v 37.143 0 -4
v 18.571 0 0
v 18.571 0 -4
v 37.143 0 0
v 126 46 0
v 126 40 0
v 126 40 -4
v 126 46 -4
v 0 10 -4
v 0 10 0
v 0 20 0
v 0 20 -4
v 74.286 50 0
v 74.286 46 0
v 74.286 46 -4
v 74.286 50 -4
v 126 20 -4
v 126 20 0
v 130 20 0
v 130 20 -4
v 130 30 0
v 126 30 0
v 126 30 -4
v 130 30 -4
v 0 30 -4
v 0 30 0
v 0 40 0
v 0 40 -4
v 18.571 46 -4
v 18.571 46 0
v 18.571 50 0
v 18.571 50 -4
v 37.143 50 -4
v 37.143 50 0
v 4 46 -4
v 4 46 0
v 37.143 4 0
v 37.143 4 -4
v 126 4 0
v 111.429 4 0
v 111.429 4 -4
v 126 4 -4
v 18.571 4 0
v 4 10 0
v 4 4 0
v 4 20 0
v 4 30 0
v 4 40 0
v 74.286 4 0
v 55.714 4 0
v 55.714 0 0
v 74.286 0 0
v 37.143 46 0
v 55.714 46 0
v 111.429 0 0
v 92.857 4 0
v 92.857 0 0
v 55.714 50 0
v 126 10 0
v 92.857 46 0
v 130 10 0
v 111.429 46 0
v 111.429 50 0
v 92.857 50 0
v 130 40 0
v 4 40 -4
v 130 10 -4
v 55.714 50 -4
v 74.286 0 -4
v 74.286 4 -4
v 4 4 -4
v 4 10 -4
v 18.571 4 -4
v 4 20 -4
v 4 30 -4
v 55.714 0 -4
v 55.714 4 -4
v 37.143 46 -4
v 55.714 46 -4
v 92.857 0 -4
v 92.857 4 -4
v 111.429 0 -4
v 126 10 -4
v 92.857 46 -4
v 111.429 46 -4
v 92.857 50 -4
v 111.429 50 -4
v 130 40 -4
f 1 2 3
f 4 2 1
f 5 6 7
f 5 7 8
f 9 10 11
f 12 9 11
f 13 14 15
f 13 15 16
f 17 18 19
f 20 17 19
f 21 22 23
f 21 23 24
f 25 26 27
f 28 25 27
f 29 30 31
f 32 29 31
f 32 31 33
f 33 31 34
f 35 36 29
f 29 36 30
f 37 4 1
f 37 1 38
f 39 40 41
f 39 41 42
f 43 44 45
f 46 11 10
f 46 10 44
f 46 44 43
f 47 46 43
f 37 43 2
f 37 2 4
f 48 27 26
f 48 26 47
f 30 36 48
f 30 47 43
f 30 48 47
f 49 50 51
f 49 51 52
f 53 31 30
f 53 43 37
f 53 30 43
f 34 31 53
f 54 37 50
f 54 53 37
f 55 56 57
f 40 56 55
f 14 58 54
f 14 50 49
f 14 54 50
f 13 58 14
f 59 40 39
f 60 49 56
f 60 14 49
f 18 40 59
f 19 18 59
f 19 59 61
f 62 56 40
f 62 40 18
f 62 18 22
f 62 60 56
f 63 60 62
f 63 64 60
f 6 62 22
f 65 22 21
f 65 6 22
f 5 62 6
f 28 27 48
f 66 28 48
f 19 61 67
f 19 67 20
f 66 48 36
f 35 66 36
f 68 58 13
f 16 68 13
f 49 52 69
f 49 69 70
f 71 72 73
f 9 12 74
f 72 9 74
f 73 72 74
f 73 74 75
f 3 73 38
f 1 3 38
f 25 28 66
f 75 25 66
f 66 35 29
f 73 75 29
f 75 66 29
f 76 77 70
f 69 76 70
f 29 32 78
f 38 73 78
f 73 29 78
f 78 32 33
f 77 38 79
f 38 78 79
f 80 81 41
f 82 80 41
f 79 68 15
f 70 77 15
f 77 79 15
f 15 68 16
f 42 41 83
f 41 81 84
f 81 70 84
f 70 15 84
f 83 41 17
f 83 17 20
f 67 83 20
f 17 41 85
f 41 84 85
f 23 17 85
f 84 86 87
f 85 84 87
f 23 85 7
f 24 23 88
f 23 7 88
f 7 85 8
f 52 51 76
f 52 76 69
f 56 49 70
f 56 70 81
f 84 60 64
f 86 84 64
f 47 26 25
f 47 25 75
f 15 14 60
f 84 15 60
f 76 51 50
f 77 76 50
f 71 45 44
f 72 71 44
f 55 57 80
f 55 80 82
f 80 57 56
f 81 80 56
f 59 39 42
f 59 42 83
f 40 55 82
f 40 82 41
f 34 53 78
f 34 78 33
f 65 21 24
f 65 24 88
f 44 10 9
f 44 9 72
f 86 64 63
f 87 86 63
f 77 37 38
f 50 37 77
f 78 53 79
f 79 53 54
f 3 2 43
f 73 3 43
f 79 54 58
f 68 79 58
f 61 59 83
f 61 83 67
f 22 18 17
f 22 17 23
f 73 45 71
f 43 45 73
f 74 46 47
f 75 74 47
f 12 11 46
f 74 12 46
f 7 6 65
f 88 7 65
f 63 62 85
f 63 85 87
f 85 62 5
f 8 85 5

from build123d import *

# Parameters (mm, degrees)
BUITENAFMETING_RECHTHOEK_W  = 130
BUITENAFMETING_RECHTHOEK_H  = 50
PLAAT_DEPTH                 = 4
TAND_HOR_W                  = 18.571428571
TAND_HOR_H                  = 4
TAND_BOVEN_DEPTH            = 5
TANDEN_PATROON_BOVEN_COUNT  = 4
TANDEN_PATROON_BOVEN_PITCH  = 37.142857143
TAND_VER_W                  = 4
TAND_VER_H                  = 10
TAND_LINKS_DEPTH            = 5
TANDEN_PATROON_LINKS_COUNT  = 3
TANDEN_PATROON_LINKS_PITCH  = 20
TAND_O_W                    = 18.571428571
TAND_O_H                    = 4
TAND_ONDER_DEPTH            = 5
TANDEN_PATROON_ONDER_COUNT  = 4
TANDEN_PATROON_ONDER_PITCH  = 37.142857143
TAND_R_W                    = 4
TAND_R_H                    = 10
TAND_RECHTS_DEPTH           = 5
TANDEN_PATROON_RECHTS_COUNT = 3
TANDEN_PATROON_RECHTS_PITCH = 20


with BuildPart() as part:
    # Buitenafmeting Rechthoek → Plaat (new body)
    with BuildSketch(Plane.XY):
        with Locations((65, 25)):
            Rectangle(BUITENAFMETING_RECHTHOEK_W, BUITENAFMETING_RECHTHOEK_H)
    extrude(amount=-PLAAT_DEPTH)

    # Tand Hor → Tand Boven (cut, through all)
    with BuildSketch(Plane.XY):
        with Locations((9.285714286, 48)):
            Rectangle(TAND_HOR_W, TAND_HOR_H)
    tand_boven = extrude(amount=-TAND_BOVEN_DEPTH, mode=Mode.SUBTRACT)

    # Tanden Patroon Boven: Tand Boven ×4
    with Locations(*[(i * TANDEN_PATROON_BOVEN_PITCH, 0, 0) for i in range(1, TANDEN_PATROON_BOVEN_COUNT)]):
        add(tand_boven, mode=Mode.SUBTRACT)

    # Tand Ver → Tand Links (cut, through all)
    with BuildSketch(Plane.XY):
        with Locations((2, 45)):
            Rectangle(TAND_VER_W, TAND_VER_H)
    tand_links = extrude(amount=-TAND_LINKS_DEPTH, mode=Mode.SUBTRACT)

    # Tanden Patroon Links: Tand Links ×3
    with Locations(*[(0, -i * TANDEN_PATROON_LINKS_PITCH, 0) for i in range(1, TANDEN_PATROON_LINKS_COUNT)]):
        add(tand_links, mode=Mode.SUBTRACT)

    # Tand O → Tand Onder (cut, through all)
    with BuildSketch(Plane.XY):
        with Locations((9.285714286, 2)):
            Rectangle(TAND_O_W, TAND_O_H)
    tand_onder = extrude(amount=-TAND_ONDER_DEPTH, mode=Mode.SUBTRACT)

    # Tanden Patroon Onder: Tand Onder ×4
    with Locations(*[(i * TANDEN_PATROON_ONDER_PITCH, 0, 0) for i in range(1, TANDEN_PATROON_ONDER_COUNT)]):
        add(tand_onder, mode=Mode.SUBTRACT)

    # Tand R → Tand Rechts (cut, through all)
    with BuildSketch(Plane.XY):
        with Locations((128, 45)):
            Rectangle(TAND_R_W, TAND_R_H)
    tand_rechts = extrude(amount=-TAND_RECHTS_DEPTH, mode=Mode.SUBTRACT)

    # Tanden Patroon Rechts: Tand Rechts ×3
    with Locations(*[(0, -i * TANDEN_PATROON_RECHTS_PITCH, 0) for i in range(1, TANDEN_PATROON_RECHTS_COUNT)]):
        add(tand_rechts, mode=Mode.SUBTRACT)


solid = part.part
